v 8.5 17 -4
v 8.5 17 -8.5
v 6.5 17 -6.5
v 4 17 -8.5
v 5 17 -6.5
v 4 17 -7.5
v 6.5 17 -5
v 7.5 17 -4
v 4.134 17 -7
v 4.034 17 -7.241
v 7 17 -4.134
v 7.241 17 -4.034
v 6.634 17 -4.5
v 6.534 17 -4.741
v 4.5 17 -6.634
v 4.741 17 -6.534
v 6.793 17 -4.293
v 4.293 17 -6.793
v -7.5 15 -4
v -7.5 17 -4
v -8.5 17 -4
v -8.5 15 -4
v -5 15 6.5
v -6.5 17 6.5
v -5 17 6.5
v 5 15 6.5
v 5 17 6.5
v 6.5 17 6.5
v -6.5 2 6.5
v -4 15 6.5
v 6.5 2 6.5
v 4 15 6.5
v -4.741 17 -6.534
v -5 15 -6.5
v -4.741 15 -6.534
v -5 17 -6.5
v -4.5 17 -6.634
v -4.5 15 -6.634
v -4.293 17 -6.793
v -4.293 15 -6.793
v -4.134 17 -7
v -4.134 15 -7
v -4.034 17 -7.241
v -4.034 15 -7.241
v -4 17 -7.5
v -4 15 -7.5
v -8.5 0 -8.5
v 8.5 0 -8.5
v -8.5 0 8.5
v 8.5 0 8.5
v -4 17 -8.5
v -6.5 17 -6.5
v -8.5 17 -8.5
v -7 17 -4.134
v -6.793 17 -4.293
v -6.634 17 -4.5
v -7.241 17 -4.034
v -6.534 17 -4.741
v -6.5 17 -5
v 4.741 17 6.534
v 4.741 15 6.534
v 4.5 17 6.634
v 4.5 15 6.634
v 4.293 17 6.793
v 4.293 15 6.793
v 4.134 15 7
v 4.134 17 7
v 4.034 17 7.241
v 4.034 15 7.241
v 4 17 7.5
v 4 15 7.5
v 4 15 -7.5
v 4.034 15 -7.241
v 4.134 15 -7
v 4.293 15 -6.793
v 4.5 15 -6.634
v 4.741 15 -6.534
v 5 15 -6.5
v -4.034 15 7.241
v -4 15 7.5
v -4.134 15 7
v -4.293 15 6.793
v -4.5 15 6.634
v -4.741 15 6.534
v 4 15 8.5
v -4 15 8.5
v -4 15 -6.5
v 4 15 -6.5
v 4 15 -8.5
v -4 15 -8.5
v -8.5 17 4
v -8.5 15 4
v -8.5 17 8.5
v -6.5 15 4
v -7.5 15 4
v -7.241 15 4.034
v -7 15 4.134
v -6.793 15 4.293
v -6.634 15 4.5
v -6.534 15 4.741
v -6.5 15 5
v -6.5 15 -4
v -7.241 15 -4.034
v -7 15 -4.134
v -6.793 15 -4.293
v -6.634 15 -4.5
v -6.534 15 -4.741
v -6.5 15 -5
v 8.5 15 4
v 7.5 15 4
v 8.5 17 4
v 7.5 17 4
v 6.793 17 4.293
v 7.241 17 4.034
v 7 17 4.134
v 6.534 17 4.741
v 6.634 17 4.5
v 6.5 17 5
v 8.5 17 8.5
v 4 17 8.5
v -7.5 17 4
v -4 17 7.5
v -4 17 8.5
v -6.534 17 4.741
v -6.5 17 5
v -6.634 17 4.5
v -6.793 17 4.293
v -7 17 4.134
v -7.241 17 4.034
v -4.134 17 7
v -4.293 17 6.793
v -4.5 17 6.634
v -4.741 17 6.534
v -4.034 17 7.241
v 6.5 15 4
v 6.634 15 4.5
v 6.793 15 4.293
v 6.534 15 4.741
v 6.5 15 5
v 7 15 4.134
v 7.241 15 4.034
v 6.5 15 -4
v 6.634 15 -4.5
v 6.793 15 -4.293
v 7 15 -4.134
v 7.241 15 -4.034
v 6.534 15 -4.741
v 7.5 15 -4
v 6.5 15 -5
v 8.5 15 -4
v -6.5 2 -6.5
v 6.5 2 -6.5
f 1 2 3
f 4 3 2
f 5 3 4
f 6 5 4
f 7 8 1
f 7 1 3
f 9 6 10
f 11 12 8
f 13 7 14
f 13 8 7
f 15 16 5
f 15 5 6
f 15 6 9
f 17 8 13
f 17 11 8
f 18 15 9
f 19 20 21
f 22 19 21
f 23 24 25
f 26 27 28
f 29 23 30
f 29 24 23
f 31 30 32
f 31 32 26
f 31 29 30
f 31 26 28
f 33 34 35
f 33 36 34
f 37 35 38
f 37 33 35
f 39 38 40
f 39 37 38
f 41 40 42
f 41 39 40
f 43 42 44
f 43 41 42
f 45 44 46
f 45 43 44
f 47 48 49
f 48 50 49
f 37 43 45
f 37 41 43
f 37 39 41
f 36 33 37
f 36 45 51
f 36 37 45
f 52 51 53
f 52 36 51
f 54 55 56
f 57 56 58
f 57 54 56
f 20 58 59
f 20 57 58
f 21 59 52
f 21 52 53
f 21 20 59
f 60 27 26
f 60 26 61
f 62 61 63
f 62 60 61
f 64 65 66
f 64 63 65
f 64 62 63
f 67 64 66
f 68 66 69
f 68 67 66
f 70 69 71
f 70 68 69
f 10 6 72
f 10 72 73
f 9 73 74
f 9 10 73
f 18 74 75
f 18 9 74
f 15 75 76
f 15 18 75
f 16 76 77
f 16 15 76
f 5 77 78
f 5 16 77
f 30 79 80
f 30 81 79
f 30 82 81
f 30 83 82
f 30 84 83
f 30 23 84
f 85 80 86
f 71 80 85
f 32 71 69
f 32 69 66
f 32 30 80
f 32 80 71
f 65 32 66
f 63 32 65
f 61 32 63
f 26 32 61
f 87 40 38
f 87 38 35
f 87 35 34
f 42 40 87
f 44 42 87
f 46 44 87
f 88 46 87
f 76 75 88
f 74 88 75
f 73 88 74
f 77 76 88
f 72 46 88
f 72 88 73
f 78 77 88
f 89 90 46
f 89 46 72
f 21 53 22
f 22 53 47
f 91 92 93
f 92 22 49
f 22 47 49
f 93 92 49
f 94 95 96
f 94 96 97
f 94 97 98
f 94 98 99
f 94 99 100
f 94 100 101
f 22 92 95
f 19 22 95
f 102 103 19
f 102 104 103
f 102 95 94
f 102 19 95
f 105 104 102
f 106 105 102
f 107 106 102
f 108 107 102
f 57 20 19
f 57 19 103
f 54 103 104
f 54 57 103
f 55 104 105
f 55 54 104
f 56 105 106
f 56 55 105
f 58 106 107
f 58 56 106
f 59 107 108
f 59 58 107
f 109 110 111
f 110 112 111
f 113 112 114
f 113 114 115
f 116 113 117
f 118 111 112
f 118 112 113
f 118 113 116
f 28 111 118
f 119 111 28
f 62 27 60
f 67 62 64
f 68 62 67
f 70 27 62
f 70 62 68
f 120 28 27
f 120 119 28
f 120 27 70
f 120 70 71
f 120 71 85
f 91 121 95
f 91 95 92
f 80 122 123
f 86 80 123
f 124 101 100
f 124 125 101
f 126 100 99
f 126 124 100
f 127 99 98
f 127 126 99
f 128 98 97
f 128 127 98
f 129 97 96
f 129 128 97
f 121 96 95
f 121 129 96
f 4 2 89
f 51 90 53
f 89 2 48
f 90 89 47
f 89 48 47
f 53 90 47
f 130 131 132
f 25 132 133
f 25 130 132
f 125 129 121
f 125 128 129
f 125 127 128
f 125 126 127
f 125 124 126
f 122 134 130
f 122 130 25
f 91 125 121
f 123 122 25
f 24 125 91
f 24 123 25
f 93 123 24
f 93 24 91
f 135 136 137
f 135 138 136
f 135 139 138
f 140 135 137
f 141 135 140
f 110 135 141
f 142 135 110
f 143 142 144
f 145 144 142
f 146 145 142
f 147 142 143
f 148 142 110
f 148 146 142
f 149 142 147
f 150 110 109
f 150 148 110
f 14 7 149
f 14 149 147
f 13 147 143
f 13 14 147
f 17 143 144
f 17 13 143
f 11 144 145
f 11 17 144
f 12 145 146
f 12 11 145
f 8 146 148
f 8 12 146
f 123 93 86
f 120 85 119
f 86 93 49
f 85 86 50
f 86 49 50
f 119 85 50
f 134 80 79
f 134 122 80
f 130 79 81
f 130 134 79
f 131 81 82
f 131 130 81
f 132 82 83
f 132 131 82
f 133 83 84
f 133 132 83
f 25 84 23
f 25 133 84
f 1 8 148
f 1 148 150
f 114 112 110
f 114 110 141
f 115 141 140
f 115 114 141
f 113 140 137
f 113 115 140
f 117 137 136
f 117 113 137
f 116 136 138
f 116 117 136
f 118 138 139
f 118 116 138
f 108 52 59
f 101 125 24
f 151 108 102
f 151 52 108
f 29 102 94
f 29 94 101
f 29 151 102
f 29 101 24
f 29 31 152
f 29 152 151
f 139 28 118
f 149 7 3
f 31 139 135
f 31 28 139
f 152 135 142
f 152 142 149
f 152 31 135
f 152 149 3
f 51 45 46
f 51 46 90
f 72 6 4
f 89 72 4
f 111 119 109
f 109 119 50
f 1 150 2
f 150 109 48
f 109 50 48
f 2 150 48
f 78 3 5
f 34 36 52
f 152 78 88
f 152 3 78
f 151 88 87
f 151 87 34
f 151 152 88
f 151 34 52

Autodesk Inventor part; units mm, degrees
ref_plane "YZ Plane" through (0, 0, 0) normal (1, 0, 0) x (0, 1, 0)
ref_plane "XZ Plane" through (0, 0, 0) normal (0, 1, 0) x (-1, 0, 0)
ref_plane "XY Plane" through (0, 0, 0) normal (0, 0, 1) x (1, 0, 0)
sketch "Sketch1" plane through (0, 0, 0) normal (0, 1, 0) x (-1, 0, 0)
  line L0 (8.5, 8.5) -> (-8.5, 8.5)
  line L1 (-8.5, 8.5) -> (-8.5, -8.5)
  line L2 (-8.5, -8.5) -> (8.5, -8.5)
  line L3 (8.5, -8.5) -> (8.5, 8.5)
  line L4 (6.5, 6.5) -> (-6.5, 6.5) construction
  line L5 (-6.5, 6.5) -> (-6.5, -6.5) construction
  line L6 (-6.5, -6.5) -> (6.5, -6.5) construction
  line L7 (6.5, -6.5) -> (6.5, 6.5) construction
  point P0 (0, 0)
  point P1 (8.5, 0)
  point P2 (0, -6.5)
  point P3 (0, -8.5)
  point P4 (6.5, 0)
  dimension "d0" = 13
  dimension "d1" = 13
  dimension "d2" = 17
extrude "Extrusion1" add sketch "Sketch1" along normal blind 17
shell "Shell1" thickness 2 removed faces 1 at (2.8333, 17, 2.8333)
sketch "Sketch2" plane through (0, 17, 0) normal (0, 1, 0) x (1, 0, 0)
  line L0 (6, -4) -> (8.5, -4)
  line L1 (4, -6) -> (4, -8.5)
  line L2 (0, -12.5225) -> (0, 10.2466) construction
  line L3 (-9.8637, 0) -> (11.1563, 0) construction
  line L4 (4, -8.5) -> (0, -8.5)
  line L5 (0, -8.5) -> (4, -8.5) construction
  line L6 (-8.5, -8.5) -> (8.5, -8.5) construction
  line L7 (6, 4) -> (8.5, 4)
  line L8 (8.5, 4) -> (8.5, 0)
  line L9 (4, 6) -> (4, 8.5)
  line L10 (4, 8.5) -> (0, 8.5)
  line L11 (8.5, -4) -> (8.5, 4)
  line L12 (-6, -4) -> (-8.5, -4)
  line L13 (-4, -6) -> (-4, -8.5)
  line L14 (-4, -8.5) -> (0, -8.5)
  line L15 (-4, 8.5) -> (0, 8.5)
  line L16 (-4, 6) -> (-4, 8.5)
  line L17 (-6, 4) -> (-8.5, 4)
  line L18 (-8.5, 4) -> (-8.5, 0)
  line L19 (-8.5, -4) -> (-8.5, 4)
  arc A0 (-4, -6) -> (-6, -4) centre (-6, -6) ccw
  arc A1 (-6, 4) -> (-4, 6) centre (-6, 6) ccw
  arc A2 (4, 6) -> (6, 4) centre (6, 6) ccw
  arc A3 (6, -4) -> (4, -6) centre (6, -6) ccw
  point P0 (0, 0)
  point P1 (4, -4)
  point P2 (4, 4)
  point P3 (-4, -4)
  point P4 (-11.1563, 0)
  point P5 (-4, 4)
  dimension "d6" = 4
  dimension "d7" = 4
  dimension "d8" = 2
extrude "Extrusion2" cut sketch "Sketch2" against normal blind 2
fillet "Fillet1" radius 1 8 edges at (-6.5, 16, 4) (-4, 16, 6.5) (-6.5, 16, -4) (-4, 16, -6.5) (4, 16, -6.5) (6.5, 16, -4) (6.5, 16, 4) (4, 16, 6.5)
equation "\"d3\" = d2"
equation "\"d7\" = d6"
properties part number "reference_magnet_box"
